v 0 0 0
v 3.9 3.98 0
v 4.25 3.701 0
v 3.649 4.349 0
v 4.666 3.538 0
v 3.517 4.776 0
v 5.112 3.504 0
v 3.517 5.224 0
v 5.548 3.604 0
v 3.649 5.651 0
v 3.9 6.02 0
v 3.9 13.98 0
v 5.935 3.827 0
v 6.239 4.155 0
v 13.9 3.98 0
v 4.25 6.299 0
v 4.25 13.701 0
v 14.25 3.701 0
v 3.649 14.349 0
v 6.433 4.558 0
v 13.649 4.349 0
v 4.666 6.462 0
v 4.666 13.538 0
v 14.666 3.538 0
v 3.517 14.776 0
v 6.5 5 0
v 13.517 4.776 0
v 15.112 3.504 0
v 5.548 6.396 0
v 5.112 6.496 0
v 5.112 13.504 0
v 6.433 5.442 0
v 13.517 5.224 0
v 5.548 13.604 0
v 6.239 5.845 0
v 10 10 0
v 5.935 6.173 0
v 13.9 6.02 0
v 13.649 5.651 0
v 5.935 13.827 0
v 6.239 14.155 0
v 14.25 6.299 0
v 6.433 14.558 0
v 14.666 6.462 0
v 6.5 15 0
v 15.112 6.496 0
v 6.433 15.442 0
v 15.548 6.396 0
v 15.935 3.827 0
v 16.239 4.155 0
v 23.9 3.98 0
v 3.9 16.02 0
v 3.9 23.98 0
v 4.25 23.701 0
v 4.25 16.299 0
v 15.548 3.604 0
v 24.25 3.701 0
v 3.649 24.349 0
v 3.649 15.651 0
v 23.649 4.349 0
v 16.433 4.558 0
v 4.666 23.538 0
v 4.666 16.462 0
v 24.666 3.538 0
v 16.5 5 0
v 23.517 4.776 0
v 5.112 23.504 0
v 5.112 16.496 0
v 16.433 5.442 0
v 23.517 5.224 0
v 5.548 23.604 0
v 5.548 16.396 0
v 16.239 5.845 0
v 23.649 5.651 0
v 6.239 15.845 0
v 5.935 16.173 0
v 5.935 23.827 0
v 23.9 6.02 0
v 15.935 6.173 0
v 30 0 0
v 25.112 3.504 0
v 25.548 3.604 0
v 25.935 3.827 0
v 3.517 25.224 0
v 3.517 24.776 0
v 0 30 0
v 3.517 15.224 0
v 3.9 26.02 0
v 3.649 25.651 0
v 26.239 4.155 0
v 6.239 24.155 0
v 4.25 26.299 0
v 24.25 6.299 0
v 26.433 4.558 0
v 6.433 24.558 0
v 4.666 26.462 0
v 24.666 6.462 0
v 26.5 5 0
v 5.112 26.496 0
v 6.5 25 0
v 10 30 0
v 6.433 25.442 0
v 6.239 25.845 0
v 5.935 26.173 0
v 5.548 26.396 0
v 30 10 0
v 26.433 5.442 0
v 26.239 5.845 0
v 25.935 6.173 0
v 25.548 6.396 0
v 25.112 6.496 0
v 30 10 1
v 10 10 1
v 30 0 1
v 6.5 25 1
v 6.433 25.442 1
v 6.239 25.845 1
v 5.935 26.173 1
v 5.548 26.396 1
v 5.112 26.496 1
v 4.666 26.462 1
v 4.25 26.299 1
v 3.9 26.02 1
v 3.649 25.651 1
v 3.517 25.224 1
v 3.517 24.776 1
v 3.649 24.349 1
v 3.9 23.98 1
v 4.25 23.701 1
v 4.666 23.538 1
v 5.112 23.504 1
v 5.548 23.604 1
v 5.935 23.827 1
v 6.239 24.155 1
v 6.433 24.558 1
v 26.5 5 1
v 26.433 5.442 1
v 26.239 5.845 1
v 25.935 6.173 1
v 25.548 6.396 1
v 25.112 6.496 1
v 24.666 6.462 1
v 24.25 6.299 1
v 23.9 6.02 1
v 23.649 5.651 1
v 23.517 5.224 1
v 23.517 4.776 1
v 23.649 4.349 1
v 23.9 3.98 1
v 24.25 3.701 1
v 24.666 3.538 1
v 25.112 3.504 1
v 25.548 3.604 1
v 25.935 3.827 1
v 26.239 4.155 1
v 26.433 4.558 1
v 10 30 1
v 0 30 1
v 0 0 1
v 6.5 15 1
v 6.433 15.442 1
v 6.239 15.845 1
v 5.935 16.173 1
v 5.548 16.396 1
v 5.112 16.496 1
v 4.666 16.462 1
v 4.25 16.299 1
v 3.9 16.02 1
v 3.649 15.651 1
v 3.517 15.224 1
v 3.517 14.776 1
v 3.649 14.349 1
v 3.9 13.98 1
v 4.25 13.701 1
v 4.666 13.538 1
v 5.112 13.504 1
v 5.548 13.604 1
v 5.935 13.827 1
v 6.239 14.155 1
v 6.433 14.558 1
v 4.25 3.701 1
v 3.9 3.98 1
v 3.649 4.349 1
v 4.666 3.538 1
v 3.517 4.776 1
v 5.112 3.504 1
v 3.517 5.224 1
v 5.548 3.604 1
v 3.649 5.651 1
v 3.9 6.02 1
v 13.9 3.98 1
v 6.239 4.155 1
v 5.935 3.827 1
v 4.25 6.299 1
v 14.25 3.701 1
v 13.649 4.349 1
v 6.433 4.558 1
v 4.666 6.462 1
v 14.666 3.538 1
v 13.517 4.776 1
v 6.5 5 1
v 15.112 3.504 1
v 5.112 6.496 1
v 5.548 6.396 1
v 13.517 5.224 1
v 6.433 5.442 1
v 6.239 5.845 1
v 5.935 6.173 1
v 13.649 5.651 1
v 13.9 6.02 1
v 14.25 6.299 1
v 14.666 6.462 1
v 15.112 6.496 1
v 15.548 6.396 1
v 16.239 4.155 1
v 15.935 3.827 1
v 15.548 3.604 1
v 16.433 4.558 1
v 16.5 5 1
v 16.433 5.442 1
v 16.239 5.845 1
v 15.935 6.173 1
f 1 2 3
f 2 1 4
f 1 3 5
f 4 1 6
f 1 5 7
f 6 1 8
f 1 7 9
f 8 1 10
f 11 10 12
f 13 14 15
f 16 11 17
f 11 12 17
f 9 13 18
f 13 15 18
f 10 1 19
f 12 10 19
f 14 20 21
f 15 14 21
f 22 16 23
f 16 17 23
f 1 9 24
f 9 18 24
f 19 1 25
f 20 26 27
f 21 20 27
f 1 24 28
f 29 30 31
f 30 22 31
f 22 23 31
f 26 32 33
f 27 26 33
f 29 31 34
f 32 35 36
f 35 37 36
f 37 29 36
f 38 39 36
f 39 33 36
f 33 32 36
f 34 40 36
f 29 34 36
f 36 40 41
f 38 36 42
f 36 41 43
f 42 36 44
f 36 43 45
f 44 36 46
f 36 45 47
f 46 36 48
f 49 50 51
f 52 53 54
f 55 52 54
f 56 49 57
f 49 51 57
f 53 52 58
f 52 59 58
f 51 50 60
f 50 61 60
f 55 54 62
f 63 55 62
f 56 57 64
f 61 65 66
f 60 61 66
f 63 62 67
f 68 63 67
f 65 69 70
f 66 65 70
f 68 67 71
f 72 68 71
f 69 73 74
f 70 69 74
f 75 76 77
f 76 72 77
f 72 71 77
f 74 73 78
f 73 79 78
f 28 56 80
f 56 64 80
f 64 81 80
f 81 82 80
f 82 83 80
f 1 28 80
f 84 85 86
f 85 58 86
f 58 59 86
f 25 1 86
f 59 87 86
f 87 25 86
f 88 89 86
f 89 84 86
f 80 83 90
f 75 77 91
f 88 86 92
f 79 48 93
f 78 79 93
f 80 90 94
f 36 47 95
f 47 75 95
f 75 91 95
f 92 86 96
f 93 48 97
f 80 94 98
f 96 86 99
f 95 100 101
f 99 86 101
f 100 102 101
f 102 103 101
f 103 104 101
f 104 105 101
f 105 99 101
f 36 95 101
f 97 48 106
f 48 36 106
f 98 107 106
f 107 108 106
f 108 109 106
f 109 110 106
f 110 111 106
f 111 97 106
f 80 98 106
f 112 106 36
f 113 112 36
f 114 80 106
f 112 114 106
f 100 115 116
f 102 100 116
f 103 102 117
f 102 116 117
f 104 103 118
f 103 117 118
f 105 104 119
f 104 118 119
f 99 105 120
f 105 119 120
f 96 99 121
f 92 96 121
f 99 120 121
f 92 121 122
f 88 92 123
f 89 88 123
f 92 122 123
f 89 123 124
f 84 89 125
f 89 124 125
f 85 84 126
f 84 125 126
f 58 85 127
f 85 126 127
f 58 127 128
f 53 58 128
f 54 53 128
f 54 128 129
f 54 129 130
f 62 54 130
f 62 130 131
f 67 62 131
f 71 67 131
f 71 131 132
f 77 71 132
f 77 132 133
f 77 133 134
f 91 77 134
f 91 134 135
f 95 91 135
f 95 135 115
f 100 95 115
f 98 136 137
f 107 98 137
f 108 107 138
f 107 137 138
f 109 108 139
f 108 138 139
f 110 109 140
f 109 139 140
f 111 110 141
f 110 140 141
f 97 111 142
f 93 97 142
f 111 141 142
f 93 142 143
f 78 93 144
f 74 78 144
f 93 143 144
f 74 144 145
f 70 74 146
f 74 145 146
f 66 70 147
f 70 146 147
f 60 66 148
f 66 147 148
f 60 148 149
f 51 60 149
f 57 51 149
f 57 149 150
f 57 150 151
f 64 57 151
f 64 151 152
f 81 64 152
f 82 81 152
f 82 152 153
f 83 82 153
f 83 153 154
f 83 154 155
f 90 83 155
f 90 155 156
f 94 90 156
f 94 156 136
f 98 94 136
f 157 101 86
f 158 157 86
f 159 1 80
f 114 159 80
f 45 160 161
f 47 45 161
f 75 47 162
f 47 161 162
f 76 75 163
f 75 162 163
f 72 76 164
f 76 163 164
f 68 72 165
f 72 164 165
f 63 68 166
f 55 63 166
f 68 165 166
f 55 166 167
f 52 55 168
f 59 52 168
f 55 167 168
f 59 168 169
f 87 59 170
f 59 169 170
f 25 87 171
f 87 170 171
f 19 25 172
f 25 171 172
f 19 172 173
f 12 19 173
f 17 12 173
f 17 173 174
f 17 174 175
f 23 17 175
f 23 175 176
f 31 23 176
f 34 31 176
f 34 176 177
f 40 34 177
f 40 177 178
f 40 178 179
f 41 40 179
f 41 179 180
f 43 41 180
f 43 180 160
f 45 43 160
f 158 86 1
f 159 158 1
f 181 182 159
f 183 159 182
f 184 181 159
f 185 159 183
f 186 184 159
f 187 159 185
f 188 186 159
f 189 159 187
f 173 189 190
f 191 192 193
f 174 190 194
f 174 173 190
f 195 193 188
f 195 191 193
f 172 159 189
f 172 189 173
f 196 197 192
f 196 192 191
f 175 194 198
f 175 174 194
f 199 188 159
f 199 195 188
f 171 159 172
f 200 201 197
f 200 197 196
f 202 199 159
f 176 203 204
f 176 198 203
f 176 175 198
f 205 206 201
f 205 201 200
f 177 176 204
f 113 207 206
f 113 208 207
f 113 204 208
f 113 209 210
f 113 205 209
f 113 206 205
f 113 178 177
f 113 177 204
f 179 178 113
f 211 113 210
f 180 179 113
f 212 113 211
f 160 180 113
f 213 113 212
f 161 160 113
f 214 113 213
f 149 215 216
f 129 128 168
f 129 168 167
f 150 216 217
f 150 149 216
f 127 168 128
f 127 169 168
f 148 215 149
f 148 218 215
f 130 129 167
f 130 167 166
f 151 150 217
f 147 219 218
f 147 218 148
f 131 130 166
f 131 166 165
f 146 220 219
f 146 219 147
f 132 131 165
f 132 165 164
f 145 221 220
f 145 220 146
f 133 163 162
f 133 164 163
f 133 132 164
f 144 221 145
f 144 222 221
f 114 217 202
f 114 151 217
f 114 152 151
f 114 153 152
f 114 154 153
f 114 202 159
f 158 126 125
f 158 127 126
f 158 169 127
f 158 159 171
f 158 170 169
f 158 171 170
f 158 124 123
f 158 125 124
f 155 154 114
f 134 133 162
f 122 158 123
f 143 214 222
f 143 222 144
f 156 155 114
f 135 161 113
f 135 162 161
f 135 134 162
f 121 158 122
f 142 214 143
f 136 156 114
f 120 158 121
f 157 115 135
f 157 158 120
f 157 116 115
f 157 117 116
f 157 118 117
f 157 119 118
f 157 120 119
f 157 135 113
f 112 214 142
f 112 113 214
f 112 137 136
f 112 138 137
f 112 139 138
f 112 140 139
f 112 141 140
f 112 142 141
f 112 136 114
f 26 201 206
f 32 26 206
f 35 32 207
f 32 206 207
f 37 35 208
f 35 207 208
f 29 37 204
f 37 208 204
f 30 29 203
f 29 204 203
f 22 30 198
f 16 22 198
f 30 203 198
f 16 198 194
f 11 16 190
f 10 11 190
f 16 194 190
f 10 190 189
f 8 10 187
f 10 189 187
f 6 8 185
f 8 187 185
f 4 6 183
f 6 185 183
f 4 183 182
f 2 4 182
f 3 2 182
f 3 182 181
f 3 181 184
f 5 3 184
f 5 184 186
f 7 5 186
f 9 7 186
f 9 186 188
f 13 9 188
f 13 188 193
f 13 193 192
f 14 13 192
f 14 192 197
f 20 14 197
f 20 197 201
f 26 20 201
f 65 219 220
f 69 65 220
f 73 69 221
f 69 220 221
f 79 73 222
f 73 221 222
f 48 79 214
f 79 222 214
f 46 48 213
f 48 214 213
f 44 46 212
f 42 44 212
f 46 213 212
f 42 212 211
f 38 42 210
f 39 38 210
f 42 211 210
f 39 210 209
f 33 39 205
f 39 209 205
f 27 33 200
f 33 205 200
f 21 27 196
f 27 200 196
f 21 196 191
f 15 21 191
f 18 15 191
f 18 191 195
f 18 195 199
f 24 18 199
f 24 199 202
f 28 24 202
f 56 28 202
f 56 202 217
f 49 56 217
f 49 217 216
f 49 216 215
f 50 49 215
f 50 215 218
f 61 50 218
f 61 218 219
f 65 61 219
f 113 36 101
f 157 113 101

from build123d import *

# Parameters (mm, degrees)
BOSS_EXTRU_1_DEPTH      = 1
ESQUISSE2_R             = 1.5
ENL_V_MAT_EXTRU_1_DEPTH = 2


with BuildPart() as part:
    # Esquisse1 → Boss.-Extru.1 (new body)
    with BuildSketch(Plane.XY):
        Polygon((0, 0), (30, 0), (30, 10), (10, 10), (10, 30), (0, 30), align=None)
    extrude(amount=BOSS_EXTRU_1_DEPTH)

    # Esquisse2 → Enlèv. mat.-Extru.1 (cut, through all)
    with BuildSketch(Plane.XY.offset(1)):
        with Locations((5, 5)):
            Circle(ESQUISSE2_R)
        with Locations((5, 15)):
            Circle(ESQUISSE2_R)
        with Locations((5, 25)):
            Circle(ESQUISSE2_R)
        with Locations((15, 5)):
            Circle(ESQUISSE2_R)
        with Locations((25, 5)):
            Circle(ESQUISSE2_R)
    extrude(amount=-ENL_V_MAT_EXTRU_1_DEPTH, mode=Mode.SUBTRACT)


solid = part.part
